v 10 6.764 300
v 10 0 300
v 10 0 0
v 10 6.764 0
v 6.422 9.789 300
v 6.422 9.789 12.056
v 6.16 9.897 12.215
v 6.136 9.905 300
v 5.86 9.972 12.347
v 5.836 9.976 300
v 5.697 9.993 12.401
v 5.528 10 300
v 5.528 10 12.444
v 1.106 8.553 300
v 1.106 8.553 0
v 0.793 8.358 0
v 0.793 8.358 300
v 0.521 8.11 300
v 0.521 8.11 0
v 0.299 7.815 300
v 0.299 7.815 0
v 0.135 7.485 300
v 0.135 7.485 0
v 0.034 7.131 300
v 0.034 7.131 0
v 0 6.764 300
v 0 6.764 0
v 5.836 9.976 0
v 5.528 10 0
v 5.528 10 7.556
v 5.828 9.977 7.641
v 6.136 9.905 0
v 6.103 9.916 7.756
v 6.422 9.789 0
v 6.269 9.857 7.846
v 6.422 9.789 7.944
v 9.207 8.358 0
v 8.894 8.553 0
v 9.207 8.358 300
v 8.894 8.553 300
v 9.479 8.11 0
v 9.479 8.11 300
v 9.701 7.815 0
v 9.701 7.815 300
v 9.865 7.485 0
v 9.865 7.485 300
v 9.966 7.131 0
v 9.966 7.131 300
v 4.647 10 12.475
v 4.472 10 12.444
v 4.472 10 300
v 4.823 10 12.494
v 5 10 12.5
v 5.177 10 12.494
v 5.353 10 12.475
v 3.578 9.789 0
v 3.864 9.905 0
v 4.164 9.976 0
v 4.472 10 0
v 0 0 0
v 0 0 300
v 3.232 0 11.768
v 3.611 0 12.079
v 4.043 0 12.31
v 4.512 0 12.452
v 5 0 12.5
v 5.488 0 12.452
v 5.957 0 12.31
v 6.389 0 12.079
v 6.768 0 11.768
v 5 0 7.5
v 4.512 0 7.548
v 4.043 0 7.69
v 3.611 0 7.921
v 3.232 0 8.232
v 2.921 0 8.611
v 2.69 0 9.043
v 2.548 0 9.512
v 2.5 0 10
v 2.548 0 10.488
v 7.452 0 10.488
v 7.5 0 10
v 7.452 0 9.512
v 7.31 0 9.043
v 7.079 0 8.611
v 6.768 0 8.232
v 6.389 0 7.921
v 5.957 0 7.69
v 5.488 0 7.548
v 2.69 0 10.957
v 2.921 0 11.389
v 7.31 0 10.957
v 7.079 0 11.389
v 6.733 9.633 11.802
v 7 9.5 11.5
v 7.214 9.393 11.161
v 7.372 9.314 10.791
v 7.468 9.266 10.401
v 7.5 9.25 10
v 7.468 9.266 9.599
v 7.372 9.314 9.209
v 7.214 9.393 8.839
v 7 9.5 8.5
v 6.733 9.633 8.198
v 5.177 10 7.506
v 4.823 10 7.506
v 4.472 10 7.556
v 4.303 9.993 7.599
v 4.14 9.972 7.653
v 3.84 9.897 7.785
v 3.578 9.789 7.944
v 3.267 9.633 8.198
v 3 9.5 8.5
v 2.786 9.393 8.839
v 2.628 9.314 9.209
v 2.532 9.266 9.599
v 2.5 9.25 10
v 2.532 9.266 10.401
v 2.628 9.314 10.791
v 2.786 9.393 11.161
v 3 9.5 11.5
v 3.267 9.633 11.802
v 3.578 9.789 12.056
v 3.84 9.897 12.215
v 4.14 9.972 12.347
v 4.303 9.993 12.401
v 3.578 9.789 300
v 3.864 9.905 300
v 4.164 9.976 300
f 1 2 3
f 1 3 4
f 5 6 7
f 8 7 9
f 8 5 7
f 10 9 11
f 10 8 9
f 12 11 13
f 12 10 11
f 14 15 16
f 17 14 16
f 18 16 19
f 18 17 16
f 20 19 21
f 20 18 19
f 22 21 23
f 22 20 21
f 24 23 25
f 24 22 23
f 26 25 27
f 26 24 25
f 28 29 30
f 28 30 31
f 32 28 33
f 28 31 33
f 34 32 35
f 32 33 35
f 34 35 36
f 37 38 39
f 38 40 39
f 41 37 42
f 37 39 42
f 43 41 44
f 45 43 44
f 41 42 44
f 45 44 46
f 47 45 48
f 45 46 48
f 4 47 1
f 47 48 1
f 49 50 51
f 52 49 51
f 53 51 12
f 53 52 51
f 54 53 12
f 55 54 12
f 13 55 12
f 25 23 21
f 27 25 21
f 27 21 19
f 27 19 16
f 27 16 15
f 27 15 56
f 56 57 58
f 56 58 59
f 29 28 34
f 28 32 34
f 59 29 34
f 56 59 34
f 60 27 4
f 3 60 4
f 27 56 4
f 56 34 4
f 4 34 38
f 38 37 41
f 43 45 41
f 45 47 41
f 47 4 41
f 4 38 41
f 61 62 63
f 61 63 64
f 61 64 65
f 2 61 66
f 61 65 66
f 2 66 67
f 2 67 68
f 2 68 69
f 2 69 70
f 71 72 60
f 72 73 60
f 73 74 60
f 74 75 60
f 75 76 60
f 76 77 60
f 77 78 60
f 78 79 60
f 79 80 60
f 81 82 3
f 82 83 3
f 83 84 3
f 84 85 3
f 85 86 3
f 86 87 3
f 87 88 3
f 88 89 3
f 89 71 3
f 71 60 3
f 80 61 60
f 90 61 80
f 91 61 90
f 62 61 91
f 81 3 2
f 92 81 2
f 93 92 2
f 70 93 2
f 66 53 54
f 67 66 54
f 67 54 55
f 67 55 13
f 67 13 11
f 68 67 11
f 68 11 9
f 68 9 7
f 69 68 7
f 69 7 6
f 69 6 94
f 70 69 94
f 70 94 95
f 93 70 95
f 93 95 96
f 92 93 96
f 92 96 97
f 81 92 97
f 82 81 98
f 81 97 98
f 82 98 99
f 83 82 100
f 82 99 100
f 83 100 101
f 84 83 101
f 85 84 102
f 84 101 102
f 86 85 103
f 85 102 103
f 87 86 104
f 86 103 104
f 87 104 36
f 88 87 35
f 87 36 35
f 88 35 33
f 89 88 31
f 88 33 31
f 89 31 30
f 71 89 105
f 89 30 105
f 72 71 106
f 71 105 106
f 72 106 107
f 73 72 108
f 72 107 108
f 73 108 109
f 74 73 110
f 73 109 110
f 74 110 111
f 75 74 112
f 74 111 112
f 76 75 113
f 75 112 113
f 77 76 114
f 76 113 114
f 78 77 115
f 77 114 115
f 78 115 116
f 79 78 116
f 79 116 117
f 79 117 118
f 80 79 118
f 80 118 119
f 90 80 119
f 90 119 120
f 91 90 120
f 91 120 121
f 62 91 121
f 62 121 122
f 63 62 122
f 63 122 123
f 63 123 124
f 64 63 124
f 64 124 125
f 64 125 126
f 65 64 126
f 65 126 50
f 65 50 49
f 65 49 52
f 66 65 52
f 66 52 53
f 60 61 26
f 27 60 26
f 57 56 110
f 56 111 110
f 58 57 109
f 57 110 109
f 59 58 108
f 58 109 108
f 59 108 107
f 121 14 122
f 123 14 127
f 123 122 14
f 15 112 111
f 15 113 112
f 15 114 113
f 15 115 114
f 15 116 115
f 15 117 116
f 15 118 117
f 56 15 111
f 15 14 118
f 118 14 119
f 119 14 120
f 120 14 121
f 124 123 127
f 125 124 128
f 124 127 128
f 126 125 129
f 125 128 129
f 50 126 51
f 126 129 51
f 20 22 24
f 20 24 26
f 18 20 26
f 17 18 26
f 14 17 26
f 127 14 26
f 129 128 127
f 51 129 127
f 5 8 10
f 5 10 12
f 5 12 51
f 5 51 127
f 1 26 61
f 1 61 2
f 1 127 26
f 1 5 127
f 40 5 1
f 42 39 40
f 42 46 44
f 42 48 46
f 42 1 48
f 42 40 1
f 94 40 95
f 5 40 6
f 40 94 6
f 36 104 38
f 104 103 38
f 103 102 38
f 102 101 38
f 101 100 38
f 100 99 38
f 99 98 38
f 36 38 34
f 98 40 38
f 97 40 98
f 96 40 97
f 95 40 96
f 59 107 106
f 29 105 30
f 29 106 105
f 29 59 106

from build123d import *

# Parameters (mm, degrees)
ESQUISSE1_W             = 10
ESQUISSE1_H             = 10
BOSS_EXTRU_1_DEPTH      = 300
ESQUISSE2_R             = 2.5
ENL_V_MAT_EXTRU_1_DEPTH = 301.333148354
ENL_V_MAT_EXTRU_2_DEPTH = 301.333148354
CONG_2_R                = 2
CONG_3_R                = 2
CONG_4_R                = 2


with BuildPart() as part:
    # Esquisse1 → Boss.-Extru.1 (new body)
    with BuildSketch(Plane.XY):
        with Locations((5, 5)):
            Rectangle(ESQUISSE1_W, ESQUISSE1_H)
    extrude(amount=BOSS_EXTRU_1_DEPTH)

    # Esquisse2 → Enlèv. mat.-Extru.1 (cut, through all)
    with BuildSketch(Plane(origin=(0, 10, 0), x_dir=(1, 0, 0), z_dir=(0, 1, 0))):
        with Locations(Location((5, -10, 0), (0, 0, 270))):
            Circle(ESQUISSE2_R)
    extrude(amount=-ENL_V_MAT_EXTRU_1_DEPTH, mode=Mode.SUBTRACT)

    # Esquisse3 → Enlèv. mat.-Extru.2 (cut, through all)
    with BuildSketch(Plane(origin=(0, 0, 0), x_dir=(-1, 0, 0), z_dir=(0, 0, -1))):
        Polygon((0, 10), (0, 8), (-4, 10), align=None)
        Polygon((-10, 10), (-10, 8), (-6, 10), align=None)
    extrude(amount=-ENL_V_MAT_EXTRU_2_DEPTH, mode=Mode.SUBTRACT)

    # Congé2
    cong_2_edges = [part.edges().sort_by_distance(p)[0] for p in [
        (6, 10, 156.145643924),
        (4, 10, 156.145643924),
    ]]
    fillet(cong_2_edges, radius=CONG_2_R)

    # Congé3
    cong_3_edges = [part.edges().sort_by_distance(p)[0] for p in [
        (0, 8, 150),
        (10, 8, 150),
    ]]
    fillet(cong_3_edges, radius=CONG_3_R)

    # Congé4
    cong_4_edges = [part.edges().sort_by_distance(p)[0] for p in [
        (6, 10, 3.854356076),
        (4, 10, 3.854356076),
    ]]
    fillet(cong_4_edges, radius=CONG_4_R)


solid = part.part
